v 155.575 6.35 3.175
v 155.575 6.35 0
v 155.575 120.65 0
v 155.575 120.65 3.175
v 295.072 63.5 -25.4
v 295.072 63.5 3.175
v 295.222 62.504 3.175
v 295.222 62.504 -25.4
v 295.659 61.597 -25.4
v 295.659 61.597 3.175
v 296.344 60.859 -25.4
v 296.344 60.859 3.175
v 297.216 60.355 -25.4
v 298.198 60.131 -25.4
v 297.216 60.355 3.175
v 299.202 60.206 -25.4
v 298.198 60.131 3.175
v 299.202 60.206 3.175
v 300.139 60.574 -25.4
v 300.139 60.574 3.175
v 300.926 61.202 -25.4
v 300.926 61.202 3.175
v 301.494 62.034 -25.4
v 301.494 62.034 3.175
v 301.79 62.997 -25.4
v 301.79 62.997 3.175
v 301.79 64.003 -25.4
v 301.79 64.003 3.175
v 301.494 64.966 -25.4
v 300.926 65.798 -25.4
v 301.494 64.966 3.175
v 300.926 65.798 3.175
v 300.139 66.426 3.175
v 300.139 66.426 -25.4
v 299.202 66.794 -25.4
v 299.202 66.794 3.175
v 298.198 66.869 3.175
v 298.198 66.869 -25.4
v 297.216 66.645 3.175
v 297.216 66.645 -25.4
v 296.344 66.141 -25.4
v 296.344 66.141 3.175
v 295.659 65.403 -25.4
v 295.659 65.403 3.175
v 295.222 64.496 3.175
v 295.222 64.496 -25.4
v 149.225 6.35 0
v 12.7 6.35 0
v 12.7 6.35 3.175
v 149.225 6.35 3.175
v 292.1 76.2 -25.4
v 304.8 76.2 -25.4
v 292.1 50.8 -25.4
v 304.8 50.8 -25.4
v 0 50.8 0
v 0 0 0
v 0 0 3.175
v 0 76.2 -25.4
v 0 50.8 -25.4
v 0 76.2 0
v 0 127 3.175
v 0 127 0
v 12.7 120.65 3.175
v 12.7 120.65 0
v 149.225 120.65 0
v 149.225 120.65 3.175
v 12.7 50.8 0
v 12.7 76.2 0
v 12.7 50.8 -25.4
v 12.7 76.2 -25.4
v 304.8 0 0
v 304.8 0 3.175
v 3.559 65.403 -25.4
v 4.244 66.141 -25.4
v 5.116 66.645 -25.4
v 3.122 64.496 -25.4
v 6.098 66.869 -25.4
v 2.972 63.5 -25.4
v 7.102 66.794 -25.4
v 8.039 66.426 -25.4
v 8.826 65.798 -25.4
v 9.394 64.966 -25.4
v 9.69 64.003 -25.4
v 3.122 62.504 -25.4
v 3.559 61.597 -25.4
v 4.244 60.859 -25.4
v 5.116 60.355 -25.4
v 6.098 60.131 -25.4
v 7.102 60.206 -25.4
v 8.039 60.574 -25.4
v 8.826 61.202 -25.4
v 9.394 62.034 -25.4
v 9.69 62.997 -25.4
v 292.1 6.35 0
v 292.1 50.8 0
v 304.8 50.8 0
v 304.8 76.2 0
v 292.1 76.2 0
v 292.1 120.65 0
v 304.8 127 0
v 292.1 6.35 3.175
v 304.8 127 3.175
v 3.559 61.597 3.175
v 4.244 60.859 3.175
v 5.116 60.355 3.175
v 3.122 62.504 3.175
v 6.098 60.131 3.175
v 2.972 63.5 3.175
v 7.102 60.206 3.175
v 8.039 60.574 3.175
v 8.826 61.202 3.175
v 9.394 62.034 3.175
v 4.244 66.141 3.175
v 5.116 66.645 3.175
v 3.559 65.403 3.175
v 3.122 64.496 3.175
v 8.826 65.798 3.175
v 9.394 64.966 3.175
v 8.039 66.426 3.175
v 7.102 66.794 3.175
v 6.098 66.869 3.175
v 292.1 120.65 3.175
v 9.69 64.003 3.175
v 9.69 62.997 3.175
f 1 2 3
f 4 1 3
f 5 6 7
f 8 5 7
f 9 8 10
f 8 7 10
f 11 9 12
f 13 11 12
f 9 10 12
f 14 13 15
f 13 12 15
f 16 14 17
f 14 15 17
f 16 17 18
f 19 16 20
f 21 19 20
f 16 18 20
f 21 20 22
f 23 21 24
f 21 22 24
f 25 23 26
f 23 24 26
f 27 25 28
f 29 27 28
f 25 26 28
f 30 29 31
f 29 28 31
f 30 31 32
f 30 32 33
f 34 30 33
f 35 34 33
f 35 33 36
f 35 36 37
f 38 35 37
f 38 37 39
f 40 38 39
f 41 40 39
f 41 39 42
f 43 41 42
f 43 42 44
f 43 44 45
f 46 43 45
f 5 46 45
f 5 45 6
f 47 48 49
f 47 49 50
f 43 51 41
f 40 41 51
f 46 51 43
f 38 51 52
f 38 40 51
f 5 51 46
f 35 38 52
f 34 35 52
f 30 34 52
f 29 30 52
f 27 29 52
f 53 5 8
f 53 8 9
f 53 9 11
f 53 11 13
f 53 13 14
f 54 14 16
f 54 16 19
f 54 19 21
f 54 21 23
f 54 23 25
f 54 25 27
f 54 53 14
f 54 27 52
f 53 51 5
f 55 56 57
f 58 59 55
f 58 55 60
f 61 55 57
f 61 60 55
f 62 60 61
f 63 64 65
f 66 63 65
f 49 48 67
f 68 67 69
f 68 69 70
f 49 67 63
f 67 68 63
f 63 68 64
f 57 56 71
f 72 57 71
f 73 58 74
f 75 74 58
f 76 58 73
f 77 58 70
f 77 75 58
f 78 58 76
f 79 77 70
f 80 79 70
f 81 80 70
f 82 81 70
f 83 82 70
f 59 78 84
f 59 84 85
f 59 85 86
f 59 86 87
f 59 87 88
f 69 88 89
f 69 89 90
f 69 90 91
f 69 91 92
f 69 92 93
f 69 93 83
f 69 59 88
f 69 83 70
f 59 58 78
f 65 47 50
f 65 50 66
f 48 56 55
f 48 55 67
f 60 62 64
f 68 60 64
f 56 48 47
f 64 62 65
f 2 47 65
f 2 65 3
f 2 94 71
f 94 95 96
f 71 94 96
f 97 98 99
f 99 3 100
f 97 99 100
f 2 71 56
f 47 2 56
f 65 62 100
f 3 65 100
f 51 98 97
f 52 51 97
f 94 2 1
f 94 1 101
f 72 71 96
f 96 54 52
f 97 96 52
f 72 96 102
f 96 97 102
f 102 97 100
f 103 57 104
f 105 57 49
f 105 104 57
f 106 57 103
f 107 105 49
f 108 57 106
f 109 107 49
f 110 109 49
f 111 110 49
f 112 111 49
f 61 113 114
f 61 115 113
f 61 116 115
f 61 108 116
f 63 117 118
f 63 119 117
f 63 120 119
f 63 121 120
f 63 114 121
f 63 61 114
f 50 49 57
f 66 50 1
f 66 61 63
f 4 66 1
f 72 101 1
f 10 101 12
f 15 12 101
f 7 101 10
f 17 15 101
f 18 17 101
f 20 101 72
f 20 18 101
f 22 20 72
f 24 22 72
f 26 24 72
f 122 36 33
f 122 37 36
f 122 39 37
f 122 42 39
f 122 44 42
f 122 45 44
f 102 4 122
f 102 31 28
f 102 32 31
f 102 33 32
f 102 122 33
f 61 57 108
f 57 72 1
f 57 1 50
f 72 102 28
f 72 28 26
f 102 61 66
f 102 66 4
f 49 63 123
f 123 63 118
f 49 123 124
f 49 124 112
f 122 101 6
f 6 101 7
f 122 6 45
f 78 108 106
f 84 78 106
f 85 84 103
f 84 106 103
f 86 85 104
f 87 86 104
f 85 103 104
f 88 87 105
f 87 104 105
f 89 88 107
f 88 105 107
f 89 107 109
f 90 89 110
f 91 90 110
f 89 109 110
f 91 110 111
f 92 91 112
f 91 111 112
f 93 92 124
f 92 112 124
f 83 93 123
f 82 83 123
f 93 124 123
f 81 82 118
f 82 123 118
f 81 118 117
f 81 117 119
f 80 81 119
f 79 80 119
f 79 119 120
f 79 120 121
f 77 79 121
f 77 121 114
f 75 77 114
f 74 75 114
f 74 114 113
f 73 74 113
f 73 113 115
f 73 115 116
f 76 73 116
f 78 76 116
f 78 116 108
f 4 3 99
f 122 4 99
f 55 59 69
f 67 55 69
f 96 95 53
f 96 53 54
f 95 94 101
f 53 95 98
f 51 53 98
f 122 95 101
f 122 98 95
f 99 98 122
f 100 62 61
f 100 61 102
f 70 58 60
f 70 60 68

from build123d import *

# Parameters (mm, degrees)
F0_W     = 304.8
F0_H     = 127
F0_W_2   = 136.525
F0_H_2   = 114.3
F1_DEPTH = 3.175
F2_W     = 12.7
F2_H     = 25.4
F3_DEPTH = 25.4
F5_D     = 6.7564


with BuildPart() as f1:
    # F0 (on Top) → F1 (new body)
    with BuildSketch(Plane.XY):
        with Locations((152.4, 63.5)):
            Rectangle(F0_W, F0_H)
        with Locations((80.9625, 63.5)):
            Rectangle(F0_W_2, F0_H_2, mode=Mode.SUBTRACT)
        with Locations((223.8375, 63.5)):
            Rectangle(F0_W_2, F0_H_2, mode=Mode.SUBTRACT)
    extrude(amount=F1_DEPTH)

    # F2 (on face) → F3 (join)
    with BuildSketch(Plane(origin=(0, 0, 0), x_dir=(1, 0, 0), z_dir=(0, 0, -1))):
        with Locations((6.35, -63.5)):
            Rectangle(F2_W, F2_H)
        with Locations((298.45, -63.5)):
            Rectangle(F2_W, F2_H)
    extrude(amount=F3_DEPTH)

    # F5 (through all)
    with Locations(Plane(origin=(0, 0, -25.4), x_dir=(1, 0, 0), z_dir=(0, 0, -1))):
        with Locations((6.35, -63.5), (298.45, -63.5)):
            Hole(F5_D / 2)


solid = f1.part
